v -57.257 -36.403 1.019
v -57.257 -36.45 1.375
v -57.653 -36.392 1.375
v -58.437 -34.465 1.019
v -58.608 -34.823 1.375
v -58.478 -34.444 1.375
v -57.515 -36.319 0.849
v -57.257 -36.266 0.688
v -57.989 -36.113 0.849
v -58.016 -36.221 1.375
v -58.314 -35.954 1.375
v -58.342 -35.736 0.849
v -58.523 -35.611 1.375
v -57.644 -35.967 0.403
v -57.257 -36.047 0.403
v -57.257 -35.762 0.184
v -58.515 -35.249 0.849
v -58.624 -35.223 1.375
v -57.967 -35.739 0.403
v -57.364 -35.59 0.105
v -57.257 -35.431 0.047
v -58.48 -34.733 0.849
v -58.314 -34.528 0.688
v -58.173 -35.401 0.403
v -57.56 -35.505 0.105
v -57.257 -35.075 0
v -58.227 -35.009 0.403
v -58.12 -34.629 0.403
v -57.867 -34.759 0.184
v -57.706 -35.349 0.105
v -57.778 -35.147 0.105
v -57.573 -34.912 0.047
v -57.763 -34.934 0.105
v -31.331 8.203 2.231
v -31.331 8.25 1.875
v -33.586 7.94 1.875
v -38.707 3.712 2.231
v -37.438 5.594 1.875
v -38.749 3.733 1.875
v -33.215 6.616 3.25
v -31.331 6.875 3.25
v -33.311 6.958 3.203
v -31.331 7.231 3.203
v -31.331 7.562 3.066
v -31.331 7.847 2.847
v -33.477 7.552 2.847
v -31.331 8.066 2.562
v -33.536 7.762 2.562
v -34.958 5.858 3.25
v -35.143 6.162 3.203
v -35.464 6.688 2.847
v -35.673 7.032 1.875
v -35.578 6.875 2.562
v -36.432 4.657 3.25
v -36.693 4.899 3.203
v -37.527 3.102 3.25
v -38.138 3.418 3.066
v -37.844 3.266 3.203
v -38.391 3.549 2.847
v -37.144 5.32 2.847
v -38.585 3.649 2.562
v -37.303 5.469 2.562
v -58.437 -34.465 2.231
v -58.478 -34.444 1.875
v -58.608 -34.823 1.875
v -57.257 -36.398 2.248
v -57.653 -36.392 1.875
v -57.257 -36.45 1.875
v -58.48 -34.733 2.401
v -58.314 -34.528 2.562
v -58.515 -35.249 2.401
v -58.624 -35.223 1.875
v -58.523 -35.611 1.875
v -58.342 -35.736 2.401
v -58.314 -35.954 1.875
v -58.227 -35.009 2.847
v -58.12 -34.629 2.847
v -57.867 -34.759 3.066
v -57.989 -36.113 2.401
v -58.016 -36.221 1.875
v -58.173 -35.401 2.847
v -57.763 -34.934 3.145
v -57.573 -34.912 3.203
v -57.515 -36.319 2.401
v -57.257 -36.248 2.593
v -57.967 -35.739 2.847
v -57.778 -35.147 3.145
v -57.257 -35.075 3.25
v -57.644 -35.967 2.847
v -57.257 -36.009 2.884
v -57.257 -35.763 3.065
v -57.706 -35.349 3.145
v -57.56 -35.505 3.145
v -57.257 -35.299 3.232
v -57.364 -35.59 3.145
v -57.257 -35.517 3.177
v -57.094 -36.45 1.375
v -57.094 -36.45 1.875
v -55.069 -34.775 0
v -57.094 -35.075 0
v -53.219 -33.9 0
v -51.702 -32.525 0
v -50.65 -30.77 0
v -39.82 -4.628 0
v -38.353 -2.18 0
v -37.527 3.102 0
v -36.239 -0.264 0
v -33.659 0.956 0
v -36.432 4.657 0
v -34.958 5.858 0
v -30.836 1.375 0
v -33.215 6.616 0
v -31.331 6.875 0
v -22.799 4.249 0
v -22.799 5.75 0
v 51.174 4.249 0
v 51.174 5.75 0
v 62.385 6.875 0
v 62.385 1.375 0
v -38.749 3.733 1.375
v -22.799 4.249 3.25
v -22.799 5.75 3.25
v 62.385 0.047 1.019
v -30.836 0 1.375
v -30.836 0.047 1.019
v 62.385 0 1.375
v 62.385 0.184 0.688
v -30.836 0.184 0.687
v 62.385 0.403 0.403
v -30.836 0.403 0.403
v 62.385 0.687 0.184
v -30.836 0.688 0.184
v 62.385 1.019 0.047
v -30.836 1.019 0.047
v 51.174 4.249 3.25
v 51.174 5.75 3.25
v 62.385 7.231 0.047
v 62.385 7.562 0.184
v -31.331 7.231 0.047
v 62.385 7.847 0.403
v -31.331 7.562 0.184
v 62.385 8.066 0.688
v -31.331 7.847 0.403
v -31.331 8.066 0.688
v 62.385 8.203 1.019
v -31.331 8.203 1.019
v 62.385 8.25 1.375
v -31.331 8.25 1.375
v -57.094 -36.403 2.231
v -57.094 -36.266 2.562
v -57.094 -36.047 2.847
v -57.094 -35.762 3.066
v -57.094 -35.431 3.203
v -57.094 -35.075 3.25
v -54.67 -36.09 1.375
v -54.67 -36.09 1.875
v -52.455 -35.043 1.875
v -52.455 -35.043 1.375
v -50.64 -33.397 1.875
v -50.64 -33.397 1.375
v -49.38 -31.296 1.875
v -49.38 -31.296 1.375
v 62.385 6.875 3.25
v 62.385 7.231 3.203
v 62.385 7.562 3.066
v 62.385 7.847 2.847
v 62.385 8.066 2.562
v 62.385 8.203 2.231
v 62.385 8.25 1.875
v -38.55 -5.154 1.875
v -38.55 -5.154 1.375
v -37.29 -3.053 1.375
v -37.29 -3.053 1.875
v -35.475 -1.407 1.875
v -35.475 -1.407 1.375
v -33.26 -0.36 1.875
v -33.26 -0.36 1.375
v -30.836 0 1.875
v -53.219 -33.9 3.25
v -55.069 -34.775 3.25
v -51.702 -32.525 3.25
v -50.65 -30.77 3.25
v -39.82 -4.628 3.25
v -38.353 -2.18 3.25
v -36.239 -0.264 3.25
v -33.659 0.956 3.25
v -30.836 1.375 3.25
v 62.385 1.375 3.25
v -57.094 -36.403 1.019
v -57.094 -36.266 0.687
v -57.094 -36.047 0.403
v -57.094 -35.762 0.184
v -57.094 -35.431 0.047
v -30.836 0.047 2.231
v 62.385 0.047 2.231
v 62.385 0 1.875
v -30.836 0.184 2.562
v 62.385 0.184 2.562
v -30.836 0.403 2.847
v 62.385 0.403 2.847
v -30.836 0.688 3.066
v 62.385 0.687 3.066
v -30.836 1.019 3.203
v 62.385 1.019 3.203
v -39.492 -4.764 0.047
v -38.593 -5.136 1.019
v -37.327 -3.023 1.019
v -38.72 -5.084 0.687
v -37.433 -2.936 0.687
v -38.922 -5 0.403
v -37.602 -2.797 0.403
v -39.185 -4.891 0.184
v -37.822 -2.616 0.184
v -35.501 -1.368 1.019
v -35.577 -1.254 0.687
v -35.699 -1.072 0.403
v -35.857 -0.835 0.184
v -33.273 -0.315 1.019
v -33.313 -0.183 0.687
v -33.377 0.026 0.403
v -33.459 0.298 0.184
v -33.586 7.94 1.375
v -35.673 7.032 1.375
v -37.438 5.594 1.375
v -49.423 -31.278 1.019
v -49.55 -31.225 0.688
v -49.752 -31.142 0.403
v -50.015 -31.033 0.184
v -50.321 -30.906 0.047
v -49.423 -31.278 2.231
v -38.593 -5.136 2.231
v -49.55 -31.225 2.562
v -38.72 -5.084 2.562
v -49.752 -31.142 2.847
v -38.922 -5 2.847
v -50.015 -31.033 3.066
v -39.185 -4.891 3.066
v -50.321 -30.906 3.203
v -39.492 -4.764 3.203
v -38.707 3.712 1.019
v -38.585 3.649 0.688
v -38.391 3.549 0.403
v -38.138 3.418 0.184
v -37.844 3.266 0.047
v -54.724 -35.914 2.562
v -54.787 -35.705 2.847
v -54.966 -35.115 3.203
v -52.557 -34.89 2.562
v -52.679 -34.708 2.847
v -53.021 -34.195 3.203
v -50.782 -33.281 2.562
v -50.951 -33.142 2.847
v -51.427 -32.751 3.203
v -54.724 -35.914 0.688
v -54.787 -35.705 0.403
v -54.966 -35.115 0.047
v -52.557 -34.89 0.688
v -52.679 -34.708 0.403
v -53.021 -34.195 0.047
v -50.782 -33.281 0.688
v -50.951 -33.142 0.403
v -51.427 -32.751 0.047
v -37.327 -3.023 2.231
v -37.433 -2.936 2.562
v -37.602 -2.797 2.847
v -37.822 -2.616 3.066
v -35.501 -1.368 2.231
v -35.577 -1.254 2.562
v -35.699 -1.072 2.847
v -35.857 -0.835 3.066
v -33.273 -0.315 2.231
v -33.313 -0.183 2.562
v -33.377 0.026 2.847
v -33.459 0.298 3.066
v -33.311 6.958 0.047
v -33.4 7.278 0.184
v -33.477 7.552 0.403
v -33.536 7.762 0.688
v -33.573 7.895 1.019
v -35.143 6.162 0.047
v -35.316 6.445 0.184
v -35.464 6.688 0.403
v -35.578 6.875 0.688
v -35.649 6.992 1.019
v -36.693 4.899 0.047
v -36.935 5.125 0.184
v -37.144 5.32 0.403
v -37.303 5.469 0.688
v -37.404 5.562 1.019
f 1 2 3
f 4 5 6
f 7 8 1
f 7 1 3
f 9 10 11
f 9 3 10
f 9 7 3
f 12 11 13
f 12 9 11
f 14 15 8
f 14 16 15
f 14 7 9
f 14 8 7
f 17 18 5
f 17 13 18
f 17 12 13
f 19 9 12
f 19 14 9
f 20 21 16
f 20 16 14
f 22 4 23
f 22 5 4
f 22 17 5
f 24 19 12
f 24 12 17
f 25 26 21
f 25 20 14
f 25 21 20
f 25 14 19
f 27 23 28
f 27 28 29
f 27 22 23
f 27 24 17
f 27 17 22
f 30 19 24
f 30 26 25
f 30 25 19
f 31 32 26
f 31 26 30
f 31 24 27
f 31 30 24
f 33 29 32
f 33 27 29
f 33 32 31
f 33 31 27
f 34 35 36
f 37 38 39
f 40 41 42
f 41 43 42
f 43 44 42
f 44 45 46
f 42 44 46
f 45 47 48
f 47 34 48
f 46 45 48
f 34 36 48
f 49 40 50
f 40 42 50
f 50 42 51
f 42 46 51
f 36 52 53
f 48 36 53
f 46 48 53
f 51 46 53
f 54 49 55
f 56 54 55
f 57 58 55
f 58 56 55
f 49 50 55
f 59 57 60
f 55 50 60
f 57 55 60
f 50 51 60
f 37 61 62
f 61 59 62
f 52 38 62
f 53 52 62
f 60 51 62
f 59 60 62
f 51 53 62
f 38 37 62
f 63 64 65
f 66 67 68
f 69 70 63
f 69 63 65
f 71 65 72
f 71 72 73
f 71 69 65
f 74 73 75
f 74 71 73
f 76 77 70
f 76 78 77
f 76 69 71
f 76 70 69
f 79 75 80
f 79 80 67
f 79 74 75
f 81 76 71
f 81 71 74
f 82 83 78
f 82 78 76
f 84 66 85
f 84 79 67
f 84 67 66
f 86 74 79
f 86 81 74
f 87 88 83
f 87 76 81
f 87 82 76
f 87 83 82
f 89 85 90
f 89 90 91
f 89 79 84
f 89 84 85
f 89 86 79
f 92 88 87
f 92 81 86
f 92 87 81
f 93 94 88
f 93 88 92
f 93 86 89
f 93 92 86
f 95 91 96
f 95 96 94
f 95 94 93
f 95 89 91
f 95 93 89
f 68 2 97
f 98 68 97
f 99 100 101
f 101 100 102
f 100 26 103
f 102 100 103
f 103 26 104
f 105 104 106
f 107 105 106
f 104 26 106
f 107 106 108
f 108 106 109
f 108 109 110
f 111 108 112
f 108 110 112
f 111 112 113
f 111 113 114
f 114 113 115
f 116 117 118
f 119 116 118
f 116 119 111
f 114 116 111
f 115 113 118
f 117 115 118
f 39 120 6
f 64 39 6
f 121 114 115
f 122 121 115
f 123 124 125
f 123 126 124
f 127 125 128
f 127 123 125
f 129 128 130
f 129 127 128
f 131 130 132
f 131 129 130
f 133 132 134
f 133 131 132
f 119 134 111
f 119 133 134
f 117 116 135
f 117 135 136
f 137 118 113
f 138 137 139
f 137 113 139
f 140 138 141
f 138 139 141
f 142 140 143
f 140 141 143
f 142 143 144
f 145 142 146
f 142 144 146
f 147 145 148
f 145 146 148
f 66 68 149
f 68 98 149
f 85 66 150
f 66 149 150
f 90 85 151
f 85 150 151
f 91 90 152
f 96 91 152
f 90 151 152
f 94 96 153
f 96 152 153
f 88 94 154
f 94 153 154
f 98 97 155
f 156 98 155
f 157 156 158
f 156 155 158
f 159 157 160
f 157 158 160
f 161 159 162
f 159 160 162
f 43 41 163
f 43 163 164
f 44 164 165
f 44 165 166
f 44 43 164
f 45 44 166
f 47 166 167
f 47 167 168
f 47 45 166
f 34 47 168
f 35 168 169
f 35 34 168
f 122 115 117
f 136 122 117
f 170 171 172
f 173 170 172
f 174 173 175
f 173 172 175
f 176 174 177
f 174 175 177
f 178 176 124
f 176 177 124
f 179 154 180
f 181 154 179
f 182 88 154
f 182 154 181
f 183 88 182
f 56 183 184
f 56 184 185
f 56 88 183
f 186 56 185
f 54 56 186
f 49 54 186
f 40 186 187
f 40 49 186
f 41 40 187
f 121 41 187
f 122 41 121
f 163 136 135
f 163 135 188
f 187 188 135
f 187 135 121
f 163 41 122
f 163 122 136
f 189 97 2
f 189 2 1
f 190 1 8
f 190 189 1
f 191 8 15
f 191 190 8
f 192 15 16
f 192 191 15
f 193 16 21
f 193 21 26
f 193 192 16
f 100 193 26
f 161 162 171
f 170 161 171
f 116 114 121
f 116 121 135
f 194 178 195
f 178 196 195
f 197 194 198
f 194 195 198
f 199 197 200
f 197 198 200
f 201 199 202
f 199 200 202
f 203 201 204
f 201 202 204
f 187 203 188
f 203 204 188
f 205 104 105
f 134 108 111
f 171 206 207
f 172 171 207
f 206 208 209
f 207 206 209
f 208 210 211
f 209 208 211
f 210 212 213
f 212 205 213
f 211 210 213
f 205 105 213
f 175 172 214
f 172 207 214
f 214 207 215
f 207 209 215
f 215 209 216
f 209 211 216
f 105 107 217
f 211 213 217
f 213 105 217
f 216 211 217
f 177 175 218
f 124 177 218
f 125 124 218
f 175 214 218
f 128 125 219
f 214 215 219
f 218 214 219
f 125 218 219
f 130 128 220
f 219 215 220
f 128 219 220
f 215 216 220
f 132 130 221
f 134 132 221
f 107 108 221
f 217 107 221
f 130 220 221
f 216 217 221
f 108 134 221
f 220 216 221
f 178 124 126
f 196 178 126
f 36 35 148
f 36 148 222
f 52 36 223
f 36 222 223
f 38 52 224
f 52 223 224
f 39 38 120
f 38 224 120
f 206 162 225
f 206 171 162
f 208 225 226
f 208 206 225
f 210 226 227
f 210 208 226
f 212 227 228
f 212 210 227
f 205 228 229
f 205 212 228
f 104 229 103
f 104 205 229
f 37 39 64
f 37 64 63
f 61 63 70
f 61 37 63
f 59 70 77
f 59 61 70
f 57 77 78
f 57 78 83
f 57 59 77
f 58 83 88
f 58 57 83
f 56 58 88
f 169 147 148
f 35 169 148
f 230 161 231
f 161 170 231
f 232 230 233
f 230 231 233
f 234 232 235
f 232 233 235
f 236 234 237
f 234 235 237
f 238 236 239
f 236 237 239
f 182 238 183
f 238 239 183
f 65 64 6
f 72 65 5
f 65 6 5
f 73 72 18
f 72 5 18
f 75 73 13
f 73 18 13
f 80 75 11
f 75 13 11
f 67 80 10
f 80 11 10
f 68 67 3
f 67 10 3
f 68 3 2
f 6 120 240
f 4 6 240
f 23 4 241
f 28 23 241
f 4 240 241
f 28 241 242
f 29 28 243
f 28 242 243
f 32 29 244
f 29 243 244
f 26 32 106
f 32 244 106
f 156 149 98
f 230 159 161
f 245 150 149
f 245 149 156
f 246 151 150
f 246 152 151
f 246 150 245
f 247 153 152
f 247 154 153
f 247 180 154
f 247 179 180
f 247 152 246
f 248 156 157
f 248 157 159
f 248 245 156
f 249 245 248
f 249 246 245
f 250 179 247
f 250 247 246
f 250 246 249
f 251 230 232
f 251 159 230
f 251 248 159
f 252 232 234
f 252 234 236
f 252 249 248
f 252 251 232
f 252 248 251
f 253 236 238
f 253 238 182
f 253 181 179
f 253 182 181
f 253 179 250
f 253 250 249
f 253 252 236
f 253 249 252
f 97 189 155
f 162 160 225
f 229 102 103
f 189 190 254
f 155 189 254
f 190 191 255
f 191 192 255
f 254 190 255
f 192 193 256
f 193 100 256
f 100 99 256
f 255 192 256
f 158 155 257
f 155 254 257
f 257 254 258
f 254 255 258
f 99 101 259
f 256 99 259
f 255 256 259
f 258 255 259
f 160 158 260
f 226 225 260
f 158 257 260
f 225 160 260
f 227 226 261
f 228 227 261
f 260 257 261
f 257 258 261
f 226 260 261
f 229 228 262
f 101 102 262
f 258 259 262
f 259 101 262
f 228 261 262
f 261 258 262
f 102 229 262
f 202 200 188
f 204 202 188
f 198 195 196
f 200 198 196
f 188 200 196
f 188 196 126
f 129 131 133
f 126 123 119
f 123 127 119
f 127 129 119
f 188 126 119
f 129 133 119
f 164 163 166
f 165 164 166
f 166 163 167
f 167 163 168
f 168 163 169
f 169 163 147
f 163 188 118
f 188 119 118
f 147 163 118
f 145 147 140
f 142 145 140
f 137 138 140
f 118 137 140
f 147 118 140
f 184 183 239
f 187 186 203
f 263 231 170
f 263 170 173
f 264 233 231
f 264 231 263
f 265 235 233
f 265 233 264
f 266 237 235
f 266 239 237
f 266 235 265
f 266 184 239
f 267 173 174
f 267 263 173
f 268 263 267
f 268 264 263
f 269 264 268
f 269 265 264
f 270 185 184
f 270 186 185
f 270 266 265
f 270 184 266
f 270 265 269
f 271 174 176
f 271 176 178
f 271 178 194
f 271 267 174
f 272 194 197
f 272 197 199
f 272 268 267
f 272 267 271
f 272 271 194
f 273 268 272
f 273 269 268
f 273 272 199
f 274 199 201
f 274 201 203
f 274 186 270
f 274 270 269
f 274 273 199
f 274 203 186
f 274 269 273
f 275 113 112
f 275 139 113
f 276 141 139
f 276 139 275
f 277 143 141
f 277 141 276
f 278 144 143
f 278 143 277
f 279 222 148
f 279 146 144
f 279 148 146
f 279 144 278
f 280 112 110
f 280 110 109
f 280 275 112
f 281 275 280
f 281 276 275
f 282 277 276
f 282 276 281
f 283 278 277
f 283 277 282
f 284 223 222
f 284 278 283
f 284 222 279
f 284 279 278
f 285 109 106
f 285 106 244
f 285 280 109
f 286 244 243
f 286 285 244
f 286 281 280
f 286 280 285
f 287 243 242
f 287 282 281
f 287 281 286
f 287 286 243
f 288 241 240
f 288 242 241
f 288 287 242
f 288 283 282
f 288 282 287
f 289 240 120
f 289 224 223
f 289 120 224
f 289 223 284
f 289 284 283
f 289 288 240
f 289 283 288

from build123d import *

# Parameters (mm, degrees)
F0_W         = 73.972383514
F0_H         = 1.5005278401
F1_DEPTH     = 3.25
F2_R         = 1.375
F3_R         = 1.375
F4_T1_DEPTH  = 42.9737045288
F4_T3_DEPTH  = 0.5
F4_T5_DEPTH  = 97.1535263256
F4_T10_DEPTH = 1.375
F4_T16_DEPTH = 1.375
F4_T20_ANGLE = 62.6710528925
F4_T22_ANGLE = 62.6710528925


# Not quite as in the source:
# - a fillet or chamfer that OpenCascade refuses, or shapes differently, is made with other operations: its cross-section is extruded or revolved along the edge and cut away or added


with BuildPart() as f1:
    # F0 (on Top) → F1 (new body)
    with BuildSketch(Plane.XY):
        with BuildLine():
            Line((62.3850544982, 0), (62.3850544982, 8.25))
            Line((62.3850544982, 8.25), (-31.3309718274, 8.25))
            ThreePointArc((-31.3309718274, 8.25), (-35.6733794922, 7.0320400779), (-38.7489899112, 3.7334720175))
            Line((-38.7489899112, 3.7334720175), (-59.5149430004, -36.45))
            Line((-59.5149430004, -36.45), (-57.0939640871, -36.45))
            ThreePointArc((-57.0939640871, -36.45), (-52.4551081593, -35.0428751739), (-49.3797131513, -31.2957522588))
            Line((-49.3797131513, -31.2957522588), (-38.5501753509, -5.1542477412))
            ThreePointArc((-38.5501753509, -5.1542477412), (-35.474780343, -1.4071248261), (-30.8359244151, 0))
            Line((-30.8359244151, 0), (62.3850544982, 0))
        make_face()
        with Locations((14.1874579713, 4.9997360799)):
            Rectangle(F0_W, F0_H, mode=Mode.SUBTRACT)
    extrude(amount=F1_DEPTH)

    # F2
    f2_edges = [f1.edges().sort_by_distance(p)[0] for p in [
        (15.774565, 0, 3.25),
    ]]
    fillet(f2_edges, radius=F2_R)

    # F3
    f3_edges = [f1.edges().sort_by_distance(p)[0] for p in [
        (15.774565, 0, 0),
    ]]
    fillet(f3_edges, radius=F3_R)

    # F4: fillet of radius 1.375 on 2 edges, made by hand

    # F4_s2 → F4_t1 (cut)
    with BuildSketch(Plane(origin=(-6.6444578792, -12.8574588468, 0), x_dir=(0, 0, 1), z_dir=(-0.4590984452, -0.8883853993, 0))):
        with BuildLine():
            ThreePointArc((1.375, 36.1380680715), (0.4027281759, 35.7353398956), (0, 34.7630680715))
            Line((0, 34.7630680715), (0, 36.1380680715))
            Line((0, 36.1380680715), (1.375, 36.1380680715))
        make_face()
        with BuildLine():
            ThreePointArc((1.875, 36.1380680715), (2.8472718241, 35.7353398956), (3.25, 34.7630680715))
            Line((3.25, 34.7630680715), (3.25, 36.1380680715))
            Line((3.25, 36.1380680715), (1.875, 36.1380680715))
        make_face()
    extrude(amount=F4_T1_DEPTH, mode=Mode.SUBTRACT)

    # F4_s4 → F4_t3 (cut)
    with BuildSketch(Plane.XY.offset(1.375)):
        with BuildLine():
            ThreePointArc((-58.478150845, -34.4437396378), (-58.4310586584, -35.7900671304), (-57.256620921, -36.45))
            Line((-57.256620921, -36.45), (-59.5149430004, -36.45))
            Line((-59.5149430004, -36.45), (-58.478150845, -34.4437396378))
        make_face()
    extrude(amount=F4_T3_DEPTH, mode=Mode.SUBTRACT)

    # F4_s6 → F4_t5 (cut)
    with BuildSketch(Plane.YZ.offset(-31.3309718274)):
        with BuildLine():
            ThreePointArc((6.875, 3.25), (7.8472718241, 2.8472718241), (8.25, 1.875))
            Line((8.25, 1.875), (8.25, 3.25))
            Line((8.25, 3.25), (6.875, 3.25))
        make_face()
        with BuildLine():
            ThreePointArc((6.875, 0), (7.8472718241, 0.4027281759), (8.25, 1.375))
            Line((8.25, 1.375), (8.25, 0))
            Line((8.25, 0), (6.875, 0))
        make_face()
    extrude(amount=F4_T5_DEPTH, mode=Mode.SUBTRACT)


with BuildPart() as f4_tool8:
    # F4_s9 → F4_t10 (new body)
    with BuildSketch(Plane.XY.offset(1.875)):
        Polygon((-57.256620921, -35.075), (-58.478150845, -34.4437396378), (-59.5149430004, -36.45), (-57.256620921, -36.45), align=None)
    extrude(amount=F4_T10_DEPTH)

    # F4_s11 → F4_t12 (revolve, cut)
    with BuildSketch(Plane(origin=(-57.256620921, -35.075, 1.875), x_dir=(0.8541365363, 0.5200488221, 0), z_dir=(0.5200488221, -0.8541365363, 0))):
        with BuildLine():
            ThreePointArc((0, -1.375), (1.375, 0), (0, 1.375))
            Line((0, 1.375), (0, -1.375))
        make_face()
    revolve(axis=Axis((-57.256620921, -35.075, 1.875), (0, 0, 1)), mode=Mode.SUBTRACT)


with BuildPart() as f1_1:
    add(f1.part)

    # F4_t7: cut F4_tool8
    add(f4_tool8.part, mode=Mode.SUBTRACT)


with BuildPart() as f4_tool14:
    # F4_s15 → F4_t16 (new body)
    with BuildSketch(Plane.XY.offset(1.375)):
        Polygon((-57.256620921, -35.075), (-58.478150845, -34.4437396378), (-59.5149430004, -36.45), (-57.256620921, -36.45), align=None)
    extrude(amount=-F4_T16_DEPTH)

    # F4_s17 → F4_t18 (revolve, cut)
    with BuildSketch(Plane(origin=(-57.256620921, -35.075, 1.375), x_dir=(0.8541365363, 0.5200488221, 0), z_dir=(-0.5200488221, 0.8541365363, 0))):
        with BuildLine():
            ThreePointArc((0, -1.375), (1.375, 0), (0, 1.375))
            Line((0, 1.375), (0, -1.375))
        make_face()
    revolve(axis=Axis((-57.256620921, -35.075, 1.375), (0, 0, -1)), mode=Mode.SUBTRACT)


with BuildPart() as f1_2:
    add(f1_1.part)

    # F4_t13: cut F4_tool14
    add(f4_tool14.part, mode=Mode.SUBTRACT)

    # F4_s19 → F4_t20 (revolve, cut)
    with BuildSketch(Plane.YZ.offset(-31.3309718274)):
        with BuildLine():
            ThreePointArc((6.875, 3.25), (7.8472718241, 2.8472718241), (8.25, 1.875))
            Line((8.25, 1.875), (8.25, 3.25))
            Line((8.25, 3.25), (6.875, 3.25))
        make_face()
    revolve(axis=Axis((-31.3309718274, -0.1, 3.25), (0, 0, 1)), revolution_arc=F4_T20_ANGLE, mode=Mode.SUBTRACT)

    # F4_s21 → F4_t22 (revolve, cut)
    with BuildSketch(Plane.YZ.offset(-31.3309718274)):
        with BuildLine():
            ThreePointArc((6.875, 0), (7.8472718241, 0.4027281759), (8.25, 1.375))
            Line((8.25, 1.375), (8.25, 0))
            Line((8.25, 0), (6.875, 0))
        make_face()
    revolve(axis=Axis((-31.3309718274, -0.1, 0), (0, 0, 1)), revolution_arc=F4_T22_ANGLE, mode=Mode.SUBTRACT)


solid = f1_2.part
